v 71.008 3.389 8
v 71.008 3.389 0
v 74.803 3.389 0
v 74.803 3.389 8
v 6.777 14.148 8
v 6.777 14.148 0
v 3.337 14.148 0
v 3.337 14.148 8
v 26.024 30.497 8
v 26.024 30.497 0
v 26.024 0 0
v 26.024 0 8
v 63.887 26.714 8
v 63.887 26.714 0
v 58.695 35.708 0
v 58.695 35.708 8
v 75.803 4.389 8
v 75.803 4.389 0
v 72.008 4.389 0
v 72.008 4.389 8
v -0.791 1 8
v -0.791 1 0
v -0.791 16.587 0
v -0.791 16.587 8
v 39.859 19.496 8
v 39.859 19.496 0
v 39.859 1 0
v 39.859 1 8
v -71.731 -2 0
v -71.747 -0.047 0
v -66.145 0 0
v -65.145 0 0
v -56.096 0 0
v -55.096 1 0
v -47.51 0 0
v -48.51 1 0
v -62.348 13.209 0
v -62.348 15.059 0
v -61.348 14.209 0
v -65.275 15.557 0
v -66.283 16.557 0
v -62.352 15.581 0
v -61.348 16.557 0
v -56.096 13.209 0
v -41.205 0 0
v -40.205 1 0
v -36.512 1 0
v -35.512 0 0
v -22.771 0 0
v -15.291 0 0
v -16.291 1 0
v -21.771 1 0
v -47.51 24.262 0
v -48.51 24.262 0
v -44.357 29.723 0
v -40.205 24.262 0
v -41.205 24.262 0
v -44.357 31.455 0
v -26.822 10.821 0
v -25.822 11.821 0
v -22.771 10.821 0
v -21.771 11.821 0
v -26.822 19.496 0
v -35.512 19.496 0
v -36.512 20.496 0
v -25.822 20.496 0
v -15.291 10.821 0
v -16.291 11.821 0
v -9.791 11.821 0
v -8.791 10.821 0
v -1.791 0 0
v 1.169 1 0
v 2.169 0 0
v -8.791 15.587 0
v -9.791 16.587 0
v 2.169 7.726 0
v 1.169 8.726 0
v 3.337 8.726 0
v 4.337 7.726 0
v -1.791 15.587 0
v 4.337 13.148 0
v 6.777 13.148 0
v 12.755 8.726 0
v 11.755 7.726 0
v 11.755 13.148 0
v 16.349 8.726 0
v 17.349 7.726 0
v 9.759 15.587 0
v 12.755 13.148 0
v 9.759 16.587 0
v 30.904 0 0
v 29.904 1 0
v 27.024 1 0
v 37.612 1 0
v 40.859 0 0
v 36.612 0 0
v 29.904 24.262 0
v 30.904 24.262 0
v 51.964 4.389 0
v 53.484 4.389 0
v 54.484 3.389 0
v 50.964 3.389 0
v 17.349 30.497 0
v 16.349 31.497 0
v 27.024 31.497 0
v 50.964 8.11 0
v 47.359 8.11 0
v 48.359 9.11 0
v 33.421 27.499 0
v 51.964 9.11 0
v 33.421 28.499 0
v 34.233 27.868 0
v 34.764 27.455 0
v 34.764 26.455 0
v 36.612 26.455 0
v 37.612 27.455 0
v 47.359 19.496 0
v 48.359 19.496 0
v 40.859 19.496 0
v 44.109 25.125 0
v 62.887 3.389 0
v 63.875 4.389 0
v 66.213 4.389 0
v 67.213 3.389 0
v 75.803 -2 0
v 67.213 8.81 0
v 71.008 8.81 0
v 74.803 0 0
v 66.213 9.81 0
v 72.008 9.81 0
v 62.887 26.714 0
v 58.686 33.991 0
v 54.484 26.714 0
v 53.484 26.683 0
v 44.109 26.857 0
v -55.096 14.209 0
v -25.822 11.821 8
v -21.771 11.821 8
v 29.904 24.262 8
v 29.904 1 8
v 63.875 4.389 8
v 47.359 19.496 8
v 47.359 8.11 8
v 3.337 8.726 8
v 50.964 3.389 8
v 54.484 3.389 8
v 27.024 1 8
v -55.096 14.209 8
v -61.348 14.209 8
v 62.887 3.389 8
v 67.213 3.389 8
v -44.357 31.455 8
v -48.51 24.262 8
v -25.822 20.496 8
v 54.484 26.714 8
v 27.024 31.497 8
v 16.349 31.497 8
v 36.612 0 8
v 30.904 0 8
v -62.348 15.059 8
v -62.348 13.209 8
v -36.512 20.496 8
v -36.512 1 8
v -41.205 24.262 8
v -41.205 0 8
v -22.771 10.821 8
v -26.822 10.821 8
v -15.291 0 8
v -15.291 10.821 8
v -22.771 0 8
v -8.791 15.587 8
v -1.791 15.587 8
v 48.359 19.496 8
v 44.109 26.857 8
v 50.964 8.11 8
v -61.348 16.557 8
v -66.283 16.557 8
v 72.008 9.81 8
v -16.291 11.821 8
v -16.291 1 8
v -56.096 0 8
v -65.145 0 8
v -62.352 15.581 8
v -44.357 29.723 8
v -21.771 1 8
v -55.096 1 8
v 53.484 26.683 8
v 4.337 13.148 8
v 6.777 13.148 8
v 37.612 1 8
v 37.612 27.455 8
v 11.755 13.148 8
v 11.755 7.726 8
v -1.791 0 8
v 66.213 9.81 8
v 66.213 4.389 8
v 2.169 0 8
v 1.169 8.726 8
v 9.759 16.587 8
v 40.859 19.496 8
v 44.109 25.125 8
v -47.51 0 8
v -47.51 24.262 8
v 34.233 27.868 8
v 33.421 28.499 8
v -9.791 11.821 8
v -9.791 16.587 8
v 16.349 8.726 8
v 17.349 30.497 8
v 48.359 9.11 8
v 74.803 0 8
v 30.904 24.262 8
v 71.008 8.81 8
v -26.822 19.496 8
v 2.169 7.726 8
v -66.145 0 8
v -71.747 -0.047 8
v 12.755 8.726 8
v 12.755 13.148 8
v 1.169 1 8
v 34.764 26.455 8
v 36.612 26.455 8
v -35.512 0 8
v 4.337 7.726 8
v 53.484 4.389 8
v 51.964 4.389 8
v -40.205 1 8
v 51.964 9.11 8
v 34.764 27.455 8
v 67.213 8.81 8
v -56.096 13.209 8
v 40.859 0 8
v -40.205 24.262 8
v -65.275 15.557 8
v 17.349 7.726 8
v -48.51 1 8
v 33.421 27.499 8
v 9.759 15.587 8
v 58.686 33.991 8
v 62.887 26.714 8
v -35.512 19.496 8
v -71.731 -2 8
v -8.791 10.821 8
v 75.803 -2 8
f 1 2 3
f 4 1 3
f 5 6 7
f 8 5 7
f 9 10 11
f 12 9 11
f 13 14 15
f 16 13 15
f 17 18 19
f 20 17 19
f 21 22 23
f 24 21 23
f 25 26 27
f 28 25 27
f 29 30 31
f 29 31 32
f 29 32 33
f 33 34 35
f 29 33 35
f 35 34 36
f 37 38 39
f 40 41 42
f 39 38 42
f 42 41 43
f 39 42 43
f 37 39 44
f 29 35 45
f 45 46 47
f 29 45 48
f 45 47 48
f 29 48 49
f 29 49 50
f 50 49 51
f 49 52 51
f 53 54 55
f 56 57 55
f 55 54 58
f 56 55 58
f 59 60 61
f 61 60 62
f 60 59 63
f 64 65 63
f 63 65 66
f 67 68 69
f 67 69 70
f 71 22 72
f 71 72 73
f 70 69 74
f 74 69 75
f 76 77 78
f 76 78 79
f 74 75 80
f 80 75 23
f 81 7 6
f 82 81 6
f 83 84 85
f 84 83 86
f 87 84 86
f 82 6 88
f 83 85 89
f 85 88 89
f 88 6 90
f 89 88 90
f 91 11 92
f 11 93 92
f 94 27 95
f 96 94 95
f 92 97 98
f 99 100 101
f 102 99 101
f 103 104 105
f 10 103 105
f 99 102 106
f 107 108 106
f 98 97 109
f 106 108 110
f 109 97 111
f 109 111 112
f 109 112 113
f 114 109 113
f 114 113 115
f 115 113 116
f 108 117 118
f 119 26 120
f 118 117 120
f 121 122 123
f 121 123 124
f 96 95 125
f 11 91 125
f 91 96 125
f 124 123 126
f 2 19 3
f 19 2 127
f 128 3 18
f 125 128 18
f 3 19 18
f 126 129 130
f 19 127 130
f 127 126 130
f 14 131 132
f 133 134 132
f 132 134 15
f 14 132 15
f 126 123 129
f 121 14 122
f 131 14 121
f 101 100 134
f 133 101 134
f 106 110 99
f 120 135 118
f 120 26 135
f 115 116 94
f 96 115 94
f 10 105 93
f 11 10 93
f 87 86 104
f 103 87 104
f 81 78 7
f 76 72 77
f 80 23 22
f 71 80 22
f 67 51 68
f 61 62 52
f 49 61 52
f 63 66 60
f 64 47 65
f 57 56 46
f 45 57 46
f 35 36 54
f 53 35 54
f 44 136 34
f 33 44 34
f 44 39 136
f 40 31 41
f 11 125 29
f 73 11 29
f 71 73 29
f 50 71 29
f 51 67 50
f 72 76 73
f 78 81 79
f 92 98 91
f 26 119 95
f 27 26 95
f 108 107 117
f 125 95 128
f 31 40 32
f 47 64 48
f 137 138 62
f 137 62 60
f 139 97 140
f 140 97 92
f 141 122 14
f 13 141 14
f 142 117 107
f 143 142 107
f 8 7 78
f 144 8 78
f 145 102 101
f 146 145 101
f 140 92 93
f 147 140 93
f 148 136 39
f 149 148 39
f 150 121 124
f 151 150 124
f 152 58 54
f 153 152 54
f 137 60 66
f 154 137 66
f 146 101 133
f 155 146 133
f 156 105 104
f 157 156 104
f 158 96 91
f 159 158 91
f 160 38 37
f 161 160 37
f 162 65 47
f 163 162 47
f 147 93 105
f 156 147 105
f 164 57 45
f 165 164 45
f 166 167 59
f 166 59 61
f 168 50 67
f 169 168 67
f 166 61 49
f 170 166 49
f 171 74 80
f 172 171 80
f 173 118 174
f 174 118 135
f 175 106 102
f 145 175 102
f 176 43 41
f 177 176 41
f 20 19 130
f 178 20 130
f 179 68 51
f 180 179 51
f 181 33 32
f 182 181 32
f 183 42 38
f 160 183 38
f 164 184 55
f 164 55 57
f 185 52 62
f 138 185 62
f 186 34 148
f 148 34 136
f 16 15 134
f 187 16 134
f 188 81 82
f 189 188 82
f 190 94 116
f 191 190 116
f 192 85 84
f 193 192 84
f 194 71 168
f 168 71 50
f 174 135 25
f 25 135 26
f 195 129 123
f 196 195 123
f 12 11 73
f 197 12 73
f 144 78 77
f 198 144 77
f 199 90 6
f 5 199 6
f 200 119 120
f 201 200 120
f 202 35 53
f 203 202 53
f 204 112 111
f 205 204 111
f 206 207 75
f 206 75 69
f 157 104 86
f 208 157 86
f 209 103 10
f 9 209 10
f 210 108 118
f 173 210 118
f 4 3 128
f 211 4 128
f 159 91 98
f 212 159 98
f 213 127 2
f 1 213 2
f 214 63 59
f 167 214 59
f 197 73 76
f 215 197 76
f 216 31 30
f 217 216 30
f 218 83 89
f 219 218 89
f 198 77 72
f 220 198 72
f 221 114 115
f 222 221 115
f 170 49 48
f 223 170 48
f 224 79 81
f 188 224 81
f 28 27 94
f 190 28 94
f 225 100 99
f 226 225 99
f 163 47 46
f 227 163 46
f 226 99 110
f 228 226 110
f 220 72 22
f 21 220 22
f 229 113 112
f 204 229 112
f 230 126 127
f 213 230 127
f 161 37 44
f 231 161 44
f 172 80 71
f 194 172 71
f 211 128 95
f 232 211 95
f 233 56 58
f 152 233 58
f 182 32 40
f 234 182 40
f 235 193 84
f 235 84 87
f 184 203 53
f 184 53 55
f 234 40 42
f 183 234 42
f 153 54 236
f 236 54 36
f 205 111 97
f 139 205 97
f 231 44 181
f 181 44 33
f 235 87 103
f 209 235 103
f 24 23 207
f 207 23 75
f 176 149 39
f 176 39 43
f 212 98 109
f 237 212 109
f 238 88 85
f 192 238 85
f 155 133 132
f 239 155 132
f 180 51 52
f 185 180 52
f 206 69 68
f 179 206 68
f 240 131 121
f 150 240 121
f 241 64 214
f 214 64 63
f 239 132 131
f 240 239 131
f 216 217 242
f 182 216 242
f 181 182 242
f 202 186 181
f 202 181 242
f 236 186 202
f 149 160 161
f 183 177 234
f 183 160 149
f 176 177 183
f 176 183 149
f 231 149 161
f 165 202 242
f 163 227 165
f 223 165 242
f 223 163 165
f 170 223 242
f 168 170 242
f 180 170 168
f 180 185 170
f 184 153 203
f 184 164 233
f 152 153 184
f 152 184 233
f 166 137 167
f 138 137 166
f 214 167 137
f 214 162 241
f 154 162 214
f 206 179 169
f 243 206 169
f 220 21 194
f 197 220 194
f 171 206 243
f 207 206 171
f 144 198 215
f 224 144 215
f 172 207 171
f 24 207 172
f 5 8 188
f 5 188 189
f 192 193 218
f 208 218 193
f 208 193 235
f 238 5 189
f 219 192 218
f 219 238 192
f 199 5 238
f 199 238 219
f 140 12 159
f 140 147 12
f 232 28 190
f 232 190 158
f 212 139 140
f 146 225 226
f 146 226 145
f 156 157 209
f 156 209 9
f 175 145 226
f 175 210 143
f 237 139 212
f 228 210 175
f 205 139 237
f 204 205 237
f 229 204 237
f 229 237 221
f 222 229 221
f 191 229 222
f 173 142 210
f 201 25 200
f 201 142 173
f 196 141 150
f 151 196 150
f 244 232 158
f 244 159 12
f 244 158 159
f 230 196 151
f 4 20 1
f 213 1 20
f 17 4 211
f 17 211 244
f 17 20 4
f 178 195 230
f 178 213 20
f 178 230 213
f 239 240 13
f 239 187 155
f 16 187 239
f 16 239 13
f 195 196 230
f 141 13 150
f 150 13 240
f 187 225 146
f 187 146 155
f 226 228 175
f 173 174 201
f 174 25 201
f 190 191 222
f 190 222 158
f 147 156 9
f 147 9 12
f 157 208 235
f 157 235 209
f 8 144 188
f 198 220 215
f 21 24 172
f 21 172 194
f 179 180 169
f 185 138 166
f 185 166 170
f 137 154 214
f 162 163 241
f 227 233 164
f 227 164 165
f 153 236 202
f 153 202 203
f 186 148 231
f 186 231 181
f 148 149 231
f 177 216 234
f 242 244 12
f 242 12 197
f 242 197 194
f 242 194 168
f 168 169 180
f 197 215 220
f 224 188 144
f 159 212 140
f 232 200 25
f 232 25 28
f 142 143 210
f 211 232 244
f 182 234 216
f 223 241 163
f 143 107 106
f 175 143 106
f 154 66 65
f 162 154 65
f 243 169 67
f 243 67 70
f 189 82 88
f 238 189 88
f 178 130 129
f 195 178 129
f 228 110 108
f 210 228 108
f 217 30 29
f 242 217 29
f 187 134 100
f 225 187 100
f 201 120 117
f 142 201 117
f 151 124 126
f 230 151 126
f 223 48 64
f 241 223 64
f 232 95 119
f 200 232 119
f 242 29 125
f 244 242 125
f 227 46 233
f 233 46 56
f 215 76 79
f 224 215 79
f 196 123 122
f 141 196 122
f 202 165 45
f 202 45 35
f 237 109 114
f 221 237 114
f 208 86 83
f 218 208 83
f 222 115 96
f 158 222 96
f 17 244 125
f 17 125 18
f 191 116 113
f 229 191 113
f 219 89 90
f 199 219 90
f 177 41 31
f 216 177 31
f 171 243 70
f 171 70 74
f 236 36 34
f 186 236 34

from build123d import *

# Parameters (mm, degrees)
F1_DEPTH = 8


with BuildPart() as f1:
    # F0 (on Top) → F1 (new body)
    with BuildSketch(Plane.XY):
        Polygon((-8.791217, 10.820824), (-8.791217, 15.58735), (-1.791217, 15.58735), (-1.791217, 0), (0, 0), (2.168675, 0), (2.168675, 7.725904), (4.33735, 7.725904), (4.33735, 13.147592), (6.77711, 13.147592), (9.759036, 15.58735), (11.755203, 13.147592), (11.755203, 7.725904), (17.3494, 7.725904), (17.3494, 30.496988), (26.024099, 30.496988), (26.024099, 7.725904), (26.024099, 0), (30.903617, 0), (30.903617, 19.495524), (30.903617, 24.262048), (33.421363, 27.499158), (34.764209, 26.454724), (36.612159, 26.454724), (36.612159, 24.262048), (36.612159, 0), (40.858796, 0), (40.858796, 19.495524), (44.108796, 25.124689), (47.358796, 19.495524), (47.358796, 8.10998), (50.963856, 8.10998), (50.963856, 3.388554), (54.483884, 3.388554), (54.483884, 26.713658), (58.685689, 33.991398), (62.887494, 26.713658), (62.887494, 3.388554), (67.212614, 3.388554), (67.212614, 8.810241), (71.00779, 8.810241), (71.00779, 3.388554), (74.802975, 3.388554), (74.802975, 0), (75.802975, 0), (75.802975, 4.388554), (74.802975, 4.388554), (72.00779, 4.388554), (72.00779, 9.810241), (68.572836, 9.810241), (66.212614, 9.810241), (66.212614, 6.689354), (66.212614, 4.388554), (64.699309, 4.388554), (63.875258, 4.388554), (63.887494, 26.713658), (58.694566, 35.708074), (53.483884, 26.682909), (53.483884, 4.388554), (51.963856, 4.388554), (51.963856, 9.10998), (48.358796, 9.10998), (48.358796, 19.495524), (44.108796, 26.85674), (39.858796, 19.495524), (39.858796, 1), (37.612159, 1), (37.612159, 27.454724), (34.764209, 27.454724), (34.232993, 27.867891), (33.421363, 28.499158), (29.903617, 24.262048), (29.903617, 1), (27.024099, 1), (27.024099, 31.496988), (16.3494, 31.496988), (16.3494, 8.725904), (12.755203, 8.725904), (12.755203, 13.147592), (9.759036, 16.58735), (6.77711, 14.147592), (4.33735, 14.147592), (3.33735, 14.147592), (3.33735, 8.725904), (1.168675, 8.725904), (1.168675, 1), (-0.791217, 1), (-0.791217, 16.58735), (-9.791217, 16.58735), (-9.791217, 11.820824), (-16.291217, 11.820824), (-16.291217, 1), (-21.771085, 1), (-21.771085, 11.820824), (-25.821578, 11.820824), (-25.821578, 20.495524), (-30.47494, 20.495524), (-36.512049, 20.495524), (-36.512049, 1), (-40.204821, 1), (-40.204821, 24.262048), (-44.357452, 31.454616), (-48.510083, 24.262048), (-48.510083, 1), (-55.096389, 1), (-55.096389, 14.208821), (-61.347563, 14.208821), (-61.347563, 16.556969), (-66.283464, 16.556969), (-66.144578, 0), (-65.144543, 0), (-65.275041, 15.556969), (-62.351945, 15.581489), (-62.347563, 15.059114), (-62.347563, 13.208821), (-56.096389, 13.208821), (-56.096389, 0), (-51.847431, 0), (-47.510083, 0), (-47.510083, 24.262048), (-44.357452, 29.722565), (-41.204821, 24.262048), (-41.204821, 0), (-35.512049, 0), (-35.512049, 19.495524), (-26.821578, 19.495524), (-26.821578, 10.820824), (-22.771085, 10.820824), (-22.771085, 0), (-17.891567, 0), (-15.291217, 0), (-15.291217, 1), (-15.291217, 10.820824), align=None)
        Polygon((0, 0), (-1.791217, 0), (-15.291217, 0), (-17.891567, 0), (-22.771085, 0), (-35.512049, 0), (-41.204821, 0), (-47.510083, 0), (-51.847431, 0), (-56.096389, 0), (-65.144543, 0), (-66.144578, 0), (-71.747227, -0.046997), (-71.730845, -2), (74.802975, -2), (75.802975, -2), (75.802975, 0), (74.802975, 0), (40.858796, 0), (36.612159, 0), (30.903617, 0), (26.024099, 0), (2.168675, 0), align=None)
    extrude(amount=F1_DEPTH)


solid = f1.part
